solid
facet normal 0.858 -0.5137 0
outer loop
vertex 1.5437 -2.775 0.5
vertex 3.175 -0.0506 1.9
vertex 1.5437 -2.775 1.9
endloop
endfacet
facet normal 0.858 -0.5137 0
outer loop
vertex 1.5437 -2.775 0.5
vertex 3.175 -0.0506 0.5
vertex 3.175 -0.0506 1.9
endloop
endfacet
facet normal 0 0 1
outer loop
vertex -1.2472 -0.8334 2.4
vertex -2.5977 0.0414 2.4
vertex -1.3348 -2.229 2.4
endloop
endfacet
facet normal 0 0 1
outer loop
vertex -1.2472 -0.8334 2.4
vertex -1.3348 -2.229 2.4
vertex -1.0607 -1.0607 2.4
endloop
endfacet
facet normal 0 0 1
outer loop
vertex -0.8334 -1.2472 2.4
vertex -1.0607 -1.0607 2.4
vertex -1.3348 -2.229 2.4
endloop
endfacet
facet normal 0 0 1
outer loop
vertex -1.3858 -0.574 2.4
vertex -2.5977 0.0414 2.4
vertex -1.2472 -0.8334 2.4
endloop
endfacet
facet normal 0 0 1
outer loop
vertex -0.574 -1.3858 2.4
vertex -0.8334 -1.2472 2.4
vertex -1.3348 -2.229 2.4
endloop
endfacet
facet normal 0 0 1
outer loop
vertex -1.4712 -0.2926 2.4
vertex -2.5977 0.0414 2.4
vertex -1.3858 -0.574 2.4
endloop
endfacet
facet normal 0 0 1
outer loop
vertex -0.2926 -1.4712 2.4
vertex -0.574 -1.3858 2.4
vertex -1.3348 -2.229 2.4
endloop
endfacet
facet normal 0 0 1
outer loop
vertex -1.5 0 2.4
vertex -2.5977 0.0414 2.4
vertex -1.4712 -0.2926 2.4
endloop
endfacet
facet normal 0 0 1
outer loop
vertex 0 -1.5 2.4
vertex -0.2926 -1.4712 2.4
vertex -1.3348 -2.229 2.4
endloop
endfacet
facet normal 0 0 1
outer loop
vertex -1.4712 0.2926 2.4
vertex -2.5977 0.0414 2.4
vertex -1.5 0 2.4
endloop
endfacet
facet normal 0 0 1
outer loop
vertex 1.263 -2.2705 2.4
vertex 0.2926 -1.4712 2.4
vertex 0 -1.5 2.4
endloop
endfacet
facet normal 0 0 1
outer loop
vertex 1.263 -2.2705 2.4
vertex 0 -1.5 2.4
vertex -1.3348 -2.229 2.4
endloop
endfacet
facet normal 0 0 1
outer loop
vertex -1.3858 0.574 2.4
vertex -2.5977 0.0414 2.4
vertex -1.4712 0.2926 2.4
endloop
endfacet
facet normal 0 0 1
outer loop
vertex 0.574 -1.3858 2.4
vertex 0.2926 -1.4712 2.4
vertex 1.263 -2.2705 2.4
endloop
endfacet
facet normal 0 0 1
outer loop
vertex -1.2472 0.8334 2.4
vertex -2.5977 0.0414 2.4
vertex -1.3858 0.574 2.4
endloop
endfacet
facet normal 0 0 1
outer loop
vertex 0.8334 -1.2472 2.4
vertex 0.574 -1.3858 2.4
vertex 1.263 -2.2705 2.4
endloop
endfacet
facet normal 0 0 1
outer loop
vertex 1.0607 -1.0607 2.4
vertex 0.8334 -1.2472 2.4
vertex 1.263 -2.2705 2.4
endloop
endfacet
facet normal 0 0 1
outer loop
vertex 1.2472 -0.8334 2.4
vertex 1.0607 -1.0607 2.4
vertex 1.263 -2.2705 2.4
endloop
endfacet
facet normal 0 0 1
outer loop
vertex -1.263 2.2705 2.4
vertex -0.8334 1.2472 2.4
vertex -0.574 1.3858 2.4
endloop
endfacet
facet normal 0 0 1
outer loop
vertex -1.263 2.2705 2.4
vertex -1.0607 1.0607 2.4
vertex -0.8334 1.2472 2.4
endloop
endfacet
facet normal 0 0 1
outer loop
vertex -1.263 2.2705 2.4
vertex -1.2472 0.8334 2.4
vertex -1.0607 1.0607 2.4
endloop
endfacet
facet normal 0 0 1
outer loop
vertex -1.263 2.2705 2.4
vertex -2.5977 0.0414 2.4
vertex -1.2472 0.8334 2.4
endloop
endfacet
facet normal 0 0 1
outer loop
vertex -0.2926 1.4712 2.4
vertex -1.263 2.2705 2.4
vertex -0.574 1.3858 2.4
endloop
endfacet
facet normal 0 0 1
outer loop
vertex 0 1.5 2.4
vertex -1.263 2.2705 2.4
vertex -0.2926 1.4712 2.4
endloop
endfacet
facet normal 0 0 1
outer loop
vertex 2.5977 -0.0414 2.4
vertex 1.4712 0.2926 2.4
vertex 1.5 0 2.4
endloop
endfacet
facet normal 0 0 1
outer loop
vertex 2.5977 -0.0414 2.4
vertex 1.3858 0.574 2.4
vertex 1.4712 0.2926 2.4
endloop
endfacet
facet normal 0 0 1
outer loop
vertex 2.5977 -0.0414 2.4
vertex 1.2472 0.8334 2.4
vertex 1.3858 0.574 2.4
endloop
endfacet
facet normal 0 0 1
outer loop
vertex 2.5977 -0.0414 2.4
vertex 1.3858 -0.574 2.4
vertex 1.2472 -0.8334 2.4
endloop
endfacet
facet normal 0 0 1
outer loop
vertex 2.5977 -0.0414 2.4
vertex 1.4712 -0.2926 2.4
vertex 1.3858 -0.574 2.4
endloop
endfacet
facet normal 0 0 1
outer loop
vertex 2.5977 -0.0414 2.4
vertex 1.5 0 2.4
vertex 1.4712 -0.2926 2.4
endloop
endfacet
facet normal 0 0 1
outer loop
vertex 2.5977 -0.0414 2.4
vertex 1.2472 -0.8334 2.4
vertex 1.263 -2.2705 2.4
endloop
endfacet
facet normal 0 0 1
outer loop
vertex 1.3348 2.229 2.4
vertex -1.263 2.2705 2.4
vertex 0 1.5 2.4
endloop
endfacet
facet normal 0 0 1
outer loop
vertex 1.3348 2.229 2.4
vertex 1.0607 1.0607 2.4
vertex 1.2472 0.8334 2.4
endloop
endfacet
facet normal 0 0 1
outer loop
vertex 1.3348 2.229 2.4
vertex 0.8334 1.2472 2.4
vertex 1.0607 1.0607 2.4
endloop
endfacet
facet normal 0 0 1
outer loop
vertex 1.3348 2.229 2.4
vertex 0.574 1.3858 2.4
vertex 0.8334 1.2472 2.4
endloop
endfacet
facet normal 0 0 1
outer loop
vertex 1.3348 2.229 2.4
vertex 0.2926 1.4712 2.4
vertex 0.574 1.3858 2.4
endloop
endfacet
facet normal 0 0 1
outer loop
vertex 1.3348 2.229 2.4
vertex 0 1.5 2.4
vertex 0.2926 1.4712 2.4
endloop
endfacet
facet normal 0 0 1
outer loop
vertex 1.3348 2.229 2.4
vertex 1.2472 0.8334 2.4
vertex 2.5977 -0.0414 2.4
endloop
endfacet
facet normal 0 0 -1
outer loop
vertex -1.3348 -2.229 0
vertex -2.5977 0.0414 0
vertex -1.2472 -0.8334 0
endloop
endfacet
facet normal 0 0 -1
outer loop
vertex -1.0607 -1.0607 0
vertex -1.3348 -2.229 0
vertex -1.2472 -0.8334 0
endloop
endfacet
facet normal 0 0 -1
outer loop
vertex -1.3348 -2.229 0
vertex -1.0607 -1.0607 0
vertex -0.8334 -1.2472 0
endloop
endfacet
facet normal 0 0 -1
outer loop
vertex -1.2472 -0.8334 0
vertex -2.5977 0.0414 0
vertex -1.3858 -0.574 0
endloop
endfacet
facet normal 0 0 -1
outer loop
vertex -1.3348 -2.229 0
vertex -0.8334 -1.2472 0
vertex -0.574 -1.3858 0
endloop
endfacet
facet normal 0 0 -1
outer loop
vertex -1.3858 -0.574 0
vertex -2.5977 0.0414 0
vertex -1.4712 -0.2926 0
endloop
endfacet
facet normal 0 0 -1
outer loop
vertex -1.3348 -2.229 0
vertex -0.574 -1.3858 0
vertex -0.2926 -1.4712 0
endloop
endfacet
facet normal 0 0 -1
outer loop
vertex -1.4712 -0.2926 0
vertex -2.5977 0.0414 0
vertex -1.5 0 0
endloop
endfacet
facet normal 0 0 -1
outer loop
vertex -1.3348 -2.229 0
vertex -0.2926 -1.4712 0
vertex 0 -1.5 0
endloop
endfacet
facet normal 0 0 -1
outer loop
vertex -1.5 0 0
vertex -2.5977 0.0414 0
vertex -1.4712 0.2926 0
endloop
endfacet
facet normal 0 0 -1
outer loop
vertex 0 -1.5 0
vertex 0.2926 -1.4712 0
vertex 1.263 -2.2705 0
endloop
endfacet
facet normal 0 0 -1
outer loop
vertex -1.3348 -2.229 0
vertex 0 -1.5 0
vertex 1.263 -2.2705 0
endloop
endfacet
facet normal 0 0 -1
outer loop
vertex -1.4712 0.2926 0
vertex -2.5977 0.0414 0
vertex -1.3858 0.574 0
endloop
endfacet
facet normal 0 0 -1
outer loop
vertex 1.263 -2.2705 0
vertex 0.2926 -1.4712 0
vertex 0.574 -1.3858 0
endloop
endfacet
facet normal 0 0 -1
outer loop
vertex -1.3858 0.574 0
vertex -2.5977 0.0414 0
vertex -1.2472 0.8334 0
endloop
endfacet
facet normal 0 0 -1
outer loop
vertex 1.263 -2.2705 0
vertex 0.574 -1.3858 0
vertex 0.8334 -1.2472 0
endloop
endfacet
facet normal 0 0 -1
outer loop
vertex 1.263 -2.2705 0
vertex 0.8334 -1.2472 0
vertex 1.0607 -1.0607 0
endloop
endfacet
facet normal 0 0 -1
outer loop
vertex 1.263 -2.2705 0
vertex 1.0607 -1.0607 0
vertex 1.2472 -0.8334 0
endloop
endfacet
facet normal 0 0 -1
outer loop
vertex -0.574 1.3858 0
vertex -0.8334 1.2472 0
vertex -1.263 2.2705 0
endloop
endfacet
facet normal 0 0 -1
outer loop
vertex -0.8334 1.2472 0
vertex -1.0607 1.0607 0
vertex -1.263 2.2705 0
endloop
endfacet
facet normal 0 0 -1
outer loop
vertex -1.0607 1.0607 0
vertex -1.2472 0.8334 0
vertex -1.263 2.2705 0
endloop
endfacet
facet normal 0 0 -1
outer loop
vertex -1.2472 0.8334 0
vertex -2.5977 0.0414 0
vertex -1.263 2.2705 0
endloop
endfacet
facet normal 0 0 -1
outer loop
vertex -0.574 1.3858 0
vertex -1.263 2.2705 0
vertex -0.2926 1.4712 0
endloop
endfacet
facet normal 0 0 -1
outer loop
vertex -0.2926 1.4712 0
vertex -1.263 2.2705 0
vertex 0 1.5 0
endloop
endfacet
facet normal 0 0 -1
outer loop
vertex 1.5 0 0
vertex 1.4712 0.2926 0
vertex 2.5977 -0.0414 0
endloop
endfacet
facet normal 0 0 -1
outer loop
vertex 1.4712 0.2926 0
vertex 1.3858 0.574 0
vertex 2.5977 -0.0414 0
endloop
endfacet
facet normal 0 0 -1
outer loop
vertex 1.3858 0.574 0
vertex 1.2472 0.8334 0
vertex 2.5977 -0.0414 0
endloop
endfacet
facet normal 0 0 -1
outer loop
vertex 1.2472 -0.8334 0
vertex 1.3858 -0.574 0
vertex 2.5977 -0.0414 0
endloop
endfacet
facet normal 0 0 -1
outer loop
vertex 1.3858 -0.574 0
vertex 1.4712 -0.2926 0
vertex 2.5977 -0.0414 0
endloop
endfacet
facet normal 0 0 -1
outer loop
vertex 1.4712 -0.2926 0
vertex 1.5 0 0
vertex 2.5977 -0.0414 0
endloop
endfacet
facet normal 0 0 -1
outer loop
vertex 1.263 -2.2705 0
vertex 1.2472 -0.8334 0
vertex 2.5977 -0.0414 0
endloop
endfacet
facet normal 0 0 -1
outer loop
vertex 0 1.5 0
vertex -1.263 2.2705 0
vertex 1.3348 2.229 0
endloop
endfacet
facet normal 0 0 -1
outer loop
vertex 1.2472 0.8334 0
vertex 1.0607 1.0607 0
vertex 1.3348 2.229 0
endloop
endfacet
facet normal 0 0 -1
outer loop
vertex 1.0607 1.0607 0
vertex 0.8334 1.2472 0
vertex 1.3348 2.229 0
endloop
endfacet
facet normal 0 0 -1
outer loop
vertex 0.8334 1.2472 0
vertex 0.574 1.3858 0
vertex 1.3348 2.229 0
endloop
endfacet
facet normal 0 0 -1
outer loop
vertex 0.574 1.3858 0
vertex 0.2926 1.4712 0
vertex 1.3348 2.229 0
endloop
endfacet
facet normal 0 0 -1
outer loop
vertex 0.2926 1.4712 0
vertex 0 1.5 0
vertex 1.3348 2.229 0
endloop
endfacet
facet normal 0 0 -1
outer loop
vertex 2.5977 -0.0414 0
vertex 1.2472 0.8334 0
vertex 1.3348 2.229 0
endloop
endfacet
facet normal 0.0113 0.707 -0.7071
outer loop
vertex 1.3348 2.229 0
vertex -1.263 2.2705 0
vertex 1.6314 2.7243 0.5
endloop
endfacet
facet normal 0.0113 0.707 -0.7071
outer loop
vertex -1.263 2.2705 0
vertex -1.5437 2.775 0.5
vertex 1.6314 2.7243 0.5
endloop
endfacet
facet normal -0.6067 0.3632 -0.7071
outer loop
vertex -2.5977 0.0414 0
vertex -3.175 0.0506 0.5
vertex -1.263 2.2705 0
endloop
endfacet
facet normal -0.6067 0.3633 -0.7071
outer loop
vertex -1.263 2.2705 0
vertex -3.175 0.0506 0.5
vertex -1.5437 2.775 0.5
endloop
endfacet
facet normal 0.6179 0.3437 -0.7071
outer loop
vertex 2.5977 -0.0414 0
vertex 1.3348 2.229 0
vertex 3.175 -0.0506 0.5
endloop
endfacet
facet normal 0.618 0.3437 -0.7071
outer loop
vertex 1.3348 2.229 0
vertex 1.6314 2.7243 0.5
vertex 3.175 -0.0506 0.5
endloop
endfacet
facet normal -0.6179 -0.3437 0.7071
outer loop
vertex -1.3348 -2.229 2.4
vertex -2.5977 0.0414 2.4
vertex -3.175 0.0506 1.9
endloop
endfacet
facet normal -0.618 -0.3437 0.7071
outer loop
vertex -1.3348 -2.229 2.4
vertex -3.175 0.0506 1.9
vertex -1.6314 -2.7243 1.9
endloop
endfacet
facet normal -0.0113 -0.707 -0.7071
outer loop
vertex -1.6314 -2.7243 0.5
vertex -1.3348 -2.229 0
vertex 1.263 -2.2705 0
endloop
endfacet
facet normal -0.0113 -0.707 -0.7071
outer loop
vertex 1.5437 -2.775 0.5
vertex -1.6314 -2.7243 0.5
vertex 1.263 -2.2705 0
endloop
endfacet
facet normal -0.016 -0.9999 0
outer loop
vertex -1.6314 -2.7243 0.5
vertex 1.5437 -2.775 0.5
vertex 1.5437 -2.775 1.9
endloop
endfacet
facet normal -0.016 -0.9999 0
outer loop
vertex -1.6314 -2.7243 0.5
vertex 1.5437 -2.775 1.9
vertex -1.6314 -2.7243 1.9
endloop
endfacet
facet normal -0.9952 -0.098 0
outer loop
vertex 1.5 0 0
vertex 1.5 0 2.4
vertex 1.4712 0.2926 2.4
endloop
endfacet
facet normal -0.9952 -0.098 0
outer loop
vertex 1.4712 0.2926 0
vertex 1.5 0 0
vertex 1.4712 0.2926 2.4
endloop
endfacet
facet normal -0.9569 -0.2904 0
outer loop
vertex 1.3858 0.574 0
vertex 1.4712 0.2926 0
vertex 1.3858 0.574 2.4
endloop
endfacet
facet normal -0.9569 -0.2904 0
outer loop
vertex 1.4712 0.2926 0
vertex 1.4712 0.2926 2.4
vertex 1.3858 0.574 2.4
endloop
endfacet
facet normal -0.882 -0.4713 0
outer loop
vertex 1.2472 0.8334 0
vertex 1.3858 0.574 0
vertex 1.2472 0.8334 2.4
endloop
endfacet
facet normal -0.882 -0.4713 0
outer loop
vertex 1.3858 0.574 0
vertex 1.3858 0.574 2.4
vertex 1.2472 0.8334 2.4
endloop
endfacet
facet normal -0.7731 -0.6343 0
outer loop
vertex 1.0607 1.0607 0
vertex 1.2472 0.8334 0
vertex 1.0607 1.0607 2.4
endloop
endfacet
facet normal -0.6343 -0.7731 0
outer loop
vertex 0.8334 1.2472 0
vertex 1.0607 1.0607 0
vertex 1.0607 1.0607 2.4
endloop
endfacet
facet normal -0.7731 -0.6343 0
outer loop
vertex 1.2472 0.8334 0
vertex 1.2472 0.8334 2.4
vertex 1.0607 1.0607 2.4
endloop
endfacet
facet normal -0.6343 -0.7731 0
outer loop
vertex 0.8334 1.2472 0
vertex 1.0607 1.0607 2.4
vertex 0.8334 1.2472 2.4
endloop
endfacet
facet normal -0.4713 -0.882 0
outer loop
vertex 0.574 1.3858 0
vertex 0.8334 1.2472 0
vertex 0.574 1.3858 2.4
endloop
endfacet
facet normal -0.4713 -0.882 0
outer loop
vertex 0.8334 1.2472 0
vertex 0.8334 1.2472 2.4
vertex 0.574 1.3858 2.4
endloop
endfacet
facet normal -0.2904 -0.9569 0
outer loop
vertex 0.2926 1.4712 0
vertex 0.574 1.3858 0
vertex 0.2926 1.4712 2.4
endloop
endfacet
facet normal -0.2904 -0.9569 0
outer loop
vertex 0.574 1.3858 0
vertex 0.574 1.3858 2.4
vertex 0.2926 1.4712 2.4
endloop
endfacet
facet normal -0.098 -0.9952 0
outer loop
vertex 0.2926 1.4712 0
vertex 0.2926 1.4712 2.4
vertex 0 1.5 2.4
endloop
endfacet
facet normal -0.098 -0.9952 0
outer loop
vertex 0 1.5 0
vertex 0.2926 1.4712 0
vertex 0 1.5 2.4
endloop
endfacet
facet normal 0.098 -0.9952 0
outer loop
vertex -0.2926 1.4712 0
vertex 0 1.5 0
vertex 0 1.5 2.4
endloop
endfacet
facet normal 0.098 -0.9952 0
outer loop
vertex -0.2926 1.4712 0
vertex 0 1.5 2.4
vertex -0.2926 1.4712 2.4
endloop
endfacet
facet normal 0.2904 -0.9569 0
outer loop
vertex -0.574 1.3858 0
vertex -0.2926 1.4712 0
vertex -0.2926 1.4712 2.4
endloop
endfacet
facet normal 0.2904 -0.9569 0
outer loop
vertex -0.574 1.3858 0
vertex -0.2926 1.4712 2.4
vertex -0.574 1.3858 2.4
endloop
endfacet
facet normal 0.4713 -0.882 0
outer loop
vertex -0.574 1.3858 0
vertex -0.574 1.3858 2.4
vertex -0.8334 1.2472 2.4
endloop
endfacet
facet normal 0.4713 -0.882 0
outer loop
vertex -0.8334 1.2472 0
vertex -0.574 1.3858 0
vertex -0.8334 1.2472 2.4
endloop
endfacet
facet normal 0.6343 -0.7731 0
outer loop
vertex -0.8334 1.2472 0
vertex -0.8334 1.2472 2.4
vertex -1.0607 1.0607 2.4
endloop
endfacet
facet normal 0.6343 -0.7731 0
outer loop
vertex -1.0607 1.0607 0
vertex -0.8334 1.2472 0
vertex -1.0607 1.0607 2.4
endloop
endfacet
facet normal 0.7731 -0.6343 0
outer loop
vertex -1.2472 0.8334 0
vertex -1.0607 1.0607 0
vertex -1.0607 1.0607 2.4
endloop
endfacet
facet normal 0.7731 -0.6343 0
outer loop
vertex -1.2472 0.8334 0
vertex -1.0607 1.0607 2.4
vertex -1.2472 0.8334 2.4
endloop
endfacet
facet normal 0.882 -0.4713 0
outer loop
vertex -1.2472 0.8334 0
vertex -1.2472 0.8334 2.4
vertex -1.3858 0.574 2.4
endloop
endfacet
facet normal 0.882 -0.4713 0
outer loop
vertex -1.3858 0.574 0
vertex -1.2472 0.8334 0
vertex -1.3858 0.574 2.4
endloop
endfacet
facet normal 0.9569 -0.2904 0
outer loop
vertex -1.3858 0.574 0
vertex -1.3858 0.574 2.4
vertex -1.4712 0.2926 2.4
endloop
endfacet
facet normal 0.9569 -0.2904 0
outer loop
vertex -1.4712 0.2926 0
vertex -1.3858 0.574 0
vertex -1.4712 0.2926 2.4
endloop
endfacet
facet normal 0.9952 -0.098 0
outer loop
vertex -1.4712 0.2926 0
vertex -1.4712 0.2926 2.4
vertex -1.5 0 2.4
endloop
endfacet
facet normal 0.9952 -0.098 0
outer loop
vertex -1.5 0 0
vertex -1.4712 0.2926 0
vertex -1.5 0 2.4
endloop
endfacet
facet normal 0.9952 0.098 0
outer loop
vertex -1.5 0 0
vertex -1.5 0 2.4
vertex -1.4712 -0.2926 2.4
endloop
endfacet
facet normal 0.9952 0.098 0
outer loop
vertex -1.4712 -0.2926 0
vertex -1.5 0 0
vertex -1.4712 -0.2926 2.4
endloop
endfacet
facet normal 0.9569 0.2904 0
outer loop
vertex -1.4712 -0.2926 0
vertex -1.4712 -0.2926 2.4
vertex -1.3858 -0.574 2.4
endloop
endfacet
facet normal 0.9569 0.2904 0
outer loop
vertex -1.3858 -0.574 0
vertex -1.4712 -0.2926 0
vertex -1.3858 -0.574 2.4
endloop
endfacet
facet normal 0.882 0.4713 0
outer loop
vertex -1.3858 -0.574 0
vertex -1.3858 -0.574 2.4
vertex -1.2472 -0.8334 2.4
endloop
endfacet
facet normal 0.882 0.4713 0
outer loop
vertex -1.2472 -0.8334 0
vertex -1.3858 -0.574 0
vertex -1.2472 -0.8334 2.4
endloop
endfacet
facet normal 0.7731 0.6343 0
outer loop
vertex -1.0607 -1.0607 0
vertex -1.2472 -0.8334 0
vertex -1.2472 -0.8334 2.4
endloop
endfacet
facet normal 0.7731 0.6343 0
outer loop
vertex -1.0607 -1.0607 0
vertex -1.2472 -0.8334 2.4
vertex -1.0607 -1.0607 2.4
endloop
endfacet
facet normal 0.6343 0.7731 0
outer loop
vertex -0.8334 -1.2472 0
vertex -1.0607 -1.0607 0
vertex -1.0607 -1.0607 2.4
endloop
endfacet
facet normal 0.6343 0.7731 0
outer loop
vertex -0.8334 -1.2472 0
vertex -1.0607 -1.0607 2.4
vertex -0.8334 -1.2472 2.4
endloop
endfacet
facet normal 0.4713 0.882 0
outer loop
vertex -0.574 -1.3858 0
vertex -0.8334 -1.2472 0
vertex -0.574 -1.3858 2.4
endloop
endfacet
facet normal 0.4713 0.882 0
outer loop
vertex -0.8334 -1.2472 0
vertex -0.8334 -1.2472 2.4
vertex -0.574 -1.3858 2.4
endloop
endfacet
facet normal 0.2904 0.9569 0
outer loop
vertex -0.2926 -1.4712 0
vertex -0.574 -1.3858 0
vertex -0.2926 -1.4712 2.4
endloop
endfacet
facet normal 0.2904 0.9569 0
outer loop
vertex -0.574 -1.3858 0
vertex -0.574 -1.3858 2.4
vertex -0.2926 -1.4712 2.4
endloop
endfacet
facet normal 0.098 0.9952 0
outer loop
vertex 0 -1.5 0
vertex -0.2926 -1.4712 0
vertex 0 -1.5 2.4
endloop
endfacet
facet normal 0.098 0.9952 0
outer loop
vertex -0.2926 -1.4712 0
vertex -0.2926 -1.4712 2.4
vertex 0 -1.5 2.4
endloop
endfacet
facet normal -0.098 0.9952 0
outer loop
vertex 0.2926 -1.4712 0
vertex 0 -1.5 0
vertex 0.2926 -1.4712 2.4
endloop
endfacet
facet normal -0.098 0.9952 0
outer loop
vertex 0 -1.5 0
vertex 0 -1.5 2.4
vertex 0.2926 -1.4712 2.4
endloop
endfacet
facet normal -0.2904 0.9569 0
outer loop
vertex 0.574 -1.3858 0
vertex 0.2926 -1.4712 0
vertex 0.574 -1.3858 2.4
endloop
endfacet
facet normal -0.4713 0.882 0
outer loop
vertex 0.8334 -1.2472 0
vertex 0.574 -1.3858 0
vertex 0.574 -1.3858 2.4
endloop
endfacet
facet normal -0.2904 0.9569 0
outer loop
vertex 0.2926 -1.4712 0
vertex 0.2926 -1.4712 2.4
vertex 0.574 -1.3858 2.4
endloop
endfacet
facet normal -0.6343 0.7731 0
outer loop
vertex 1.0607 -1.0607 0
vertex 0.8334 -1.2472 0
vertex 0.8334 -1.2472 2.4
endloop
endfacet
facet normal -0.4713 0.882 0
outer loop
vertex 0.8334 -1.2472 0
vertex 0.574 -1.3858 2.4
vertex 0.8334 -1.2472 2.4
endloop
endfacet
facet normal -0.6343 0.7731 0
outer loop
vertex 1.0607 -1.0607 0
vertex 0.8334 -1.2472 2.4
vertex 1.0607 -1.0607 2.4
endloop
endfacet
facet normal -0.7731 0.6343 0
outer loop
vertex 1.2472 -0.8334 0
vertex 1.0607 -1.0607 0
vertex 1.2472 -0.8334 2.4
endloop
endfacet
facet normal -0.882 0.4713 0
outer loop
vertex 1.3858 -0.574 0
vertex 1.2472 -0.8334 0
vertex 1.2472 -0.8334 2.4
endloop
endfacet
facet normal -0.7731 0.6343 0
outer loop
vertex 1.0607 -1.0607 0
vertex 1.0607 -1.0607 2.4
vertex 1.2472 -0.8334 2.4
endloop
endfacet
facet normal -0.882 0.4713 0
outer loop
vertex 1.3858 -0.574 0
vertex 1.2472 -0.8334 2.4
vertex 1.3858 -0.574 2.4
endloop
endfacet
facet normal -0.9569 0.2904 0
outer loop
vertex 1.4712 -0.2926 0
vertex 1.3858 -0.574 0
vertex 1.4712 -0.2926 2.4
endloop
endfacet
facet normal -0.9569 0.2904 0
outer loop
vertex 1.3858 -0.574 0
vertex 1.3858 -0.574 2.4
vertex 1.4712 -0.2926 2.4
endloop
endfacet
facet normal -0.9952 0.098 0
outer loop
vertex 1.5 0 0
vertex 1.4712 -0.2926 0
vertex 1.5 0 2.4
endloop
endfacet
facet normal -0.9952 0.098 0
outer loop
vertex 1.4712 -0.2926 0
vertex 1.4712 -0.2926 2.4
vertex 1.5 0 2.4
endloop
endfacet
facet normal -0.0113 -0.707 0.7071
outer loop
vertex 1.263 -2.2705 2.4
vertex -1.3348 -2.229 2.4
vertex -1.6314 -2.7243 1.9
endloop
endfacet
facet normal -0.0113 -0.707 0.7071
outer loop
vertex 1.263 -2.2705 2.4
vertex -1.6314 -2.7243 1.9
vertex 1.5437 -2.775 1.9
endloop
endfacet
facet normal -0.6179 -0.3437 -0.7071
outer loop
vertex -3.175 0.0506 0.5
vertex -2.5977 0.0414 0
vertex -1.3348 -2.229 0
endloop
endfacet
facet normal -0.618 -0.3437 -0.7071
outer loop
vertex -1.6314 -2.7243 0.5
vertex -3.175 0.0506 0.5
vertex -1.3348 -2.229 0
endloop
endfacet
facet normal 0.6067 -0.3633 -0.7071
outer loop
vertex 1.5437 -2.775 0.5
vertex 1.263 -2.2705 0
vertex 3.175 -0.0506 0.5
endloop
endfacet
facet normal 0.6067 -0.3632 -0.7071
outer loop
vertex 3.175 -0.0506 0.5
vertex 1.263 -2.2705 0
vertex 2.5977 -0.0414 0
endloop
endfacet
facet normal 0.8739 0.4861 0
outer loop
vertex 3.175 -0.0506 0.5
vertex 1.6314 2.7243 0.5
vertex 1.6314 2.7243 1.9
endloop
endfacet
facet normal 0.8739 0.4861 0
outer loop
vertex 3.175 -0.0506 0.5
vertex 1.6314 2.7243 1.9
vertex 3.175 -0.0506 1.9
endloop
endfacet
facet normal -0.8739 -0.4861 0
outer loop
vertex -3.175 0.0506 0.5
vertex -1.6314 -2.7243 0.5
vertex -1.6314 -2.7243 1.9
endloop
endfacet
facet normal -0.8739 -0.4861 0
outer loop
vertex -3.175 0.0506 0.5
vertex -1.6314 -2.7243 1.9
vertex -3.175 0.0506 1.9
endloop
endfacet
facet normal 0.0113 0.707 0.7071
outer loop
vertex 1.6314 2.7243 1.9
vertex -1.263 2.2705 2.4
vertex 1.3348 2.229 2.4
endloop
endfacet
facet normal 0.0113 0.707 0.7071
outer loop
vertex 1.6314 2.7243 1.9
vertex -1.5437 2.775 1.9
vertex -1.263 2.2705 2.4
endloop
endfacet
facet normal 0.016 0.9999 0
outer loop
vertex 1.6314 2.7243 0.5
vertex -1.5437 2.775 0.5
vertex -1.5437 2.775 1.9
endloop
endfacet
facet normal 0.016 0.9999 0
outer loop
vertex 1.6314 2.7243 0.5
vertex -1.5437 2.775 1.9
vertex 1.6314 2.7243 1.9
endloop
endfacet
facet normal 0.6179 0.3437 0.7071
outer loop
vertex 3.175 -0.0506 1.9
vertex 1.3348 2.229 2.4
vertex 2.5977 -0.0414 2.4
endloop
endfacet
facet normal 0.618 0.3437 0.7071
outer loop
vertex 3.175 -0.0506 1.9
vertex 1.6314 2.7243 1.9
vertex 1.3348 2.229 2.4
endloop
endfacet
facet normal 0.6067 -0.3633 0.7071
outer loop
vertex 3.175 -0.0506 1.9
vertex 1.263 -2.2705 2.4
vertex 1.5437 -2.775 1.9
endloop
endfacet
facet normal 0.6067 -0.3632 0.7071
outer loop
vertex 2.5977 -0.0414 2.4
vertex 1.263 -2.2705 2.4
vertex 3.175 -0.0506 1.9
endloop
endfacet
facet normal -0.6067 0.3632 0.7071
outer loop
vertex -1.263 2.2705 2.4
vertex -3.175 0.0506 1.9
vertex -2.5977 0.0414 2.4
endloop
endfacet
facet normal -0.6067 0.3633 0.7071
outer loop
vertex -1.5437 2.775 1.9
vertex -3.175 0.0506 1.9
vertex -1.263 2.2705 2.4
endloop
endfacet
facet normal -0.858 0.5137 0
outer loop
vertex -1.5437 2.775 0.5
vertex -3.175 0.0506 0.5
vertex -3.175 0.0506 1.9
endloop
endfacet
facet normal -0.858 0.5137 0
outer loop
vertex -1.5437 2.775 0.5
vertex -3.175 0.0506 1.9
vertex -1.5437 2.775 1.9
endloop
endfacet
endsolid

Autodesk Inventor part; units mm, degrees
ref_plane "YZ Plane" through (0, 0, 0) normal (1, 0, 0) x (0, 1, 0)
ref_plane "XZ Plane" through (0, 0, 0) normal (0, 1, 0) x (-1, 0, 0)
ref_plane "XY Plane" through (0, 0, 0) normal (0, 0, 1) x (1, 0, 0)
sketch "スケッチ1" plane through (0, 0, 0) normal (0, 0, 1) x (1, 0, 0)
  line L0 (1.5437, -2.775) -> (-1.6314, -2.7243)
  line L1 (-1.6314, -2.7243) -> (-3.175, 0.0506)
  line L2 (-3.175, 0.0506) -> (-1.5437, 2.775)
  line L3 (-1.5437, 2.775) -> (1.6314, 2.7243)
  line L4 (1.6314, 2.7243) -> (3.175, -0.0506)
  line L5 (3.175, -0.0506) -> (1.5437, -2.775)
  point P0 (0, 0)
  point P1 (0, 0)
  dimension "d0" = 5.5
extrude "押し出し1" add sketch "スケッチ1" along normal blind 2.4
sketch "スケッチ2" plane through (0, 0, 2.4) normal (0, 0, 1) x (1, 0, 0)
  circle A0 centre (0, 0) radius 1.5
  dimension "d3" = 3
extrude "押し出し2" cut sketch "スケッチ2" against normal blind 2.4
thread "ねじ1" size "M3x0.5" class "6H" standard "ANSI Metric M Profile" full length
chamfer "面取り1" distance 0.5 angle 45 12 edges at (2.3593, -1.4128, 2.4) (2.4032, 1.3369, 2.4) (0.0438, 2.7497, 2.4) (-2.3593, 1.4128, 2.4) (-2.4032, -1.3369, 2.4) (-0.0438, -2.7497, 2.4) (-0.0438, -2.7497, 0) (2.3593, -1.4128, 0) (2.4032, 1.3369, 0) (0.0438, 2.7497, 0) (-2.3593, 1.4128, 0) (-2.4032, -1.3369, 0)
properties part number "Nut" material "真鍮"
